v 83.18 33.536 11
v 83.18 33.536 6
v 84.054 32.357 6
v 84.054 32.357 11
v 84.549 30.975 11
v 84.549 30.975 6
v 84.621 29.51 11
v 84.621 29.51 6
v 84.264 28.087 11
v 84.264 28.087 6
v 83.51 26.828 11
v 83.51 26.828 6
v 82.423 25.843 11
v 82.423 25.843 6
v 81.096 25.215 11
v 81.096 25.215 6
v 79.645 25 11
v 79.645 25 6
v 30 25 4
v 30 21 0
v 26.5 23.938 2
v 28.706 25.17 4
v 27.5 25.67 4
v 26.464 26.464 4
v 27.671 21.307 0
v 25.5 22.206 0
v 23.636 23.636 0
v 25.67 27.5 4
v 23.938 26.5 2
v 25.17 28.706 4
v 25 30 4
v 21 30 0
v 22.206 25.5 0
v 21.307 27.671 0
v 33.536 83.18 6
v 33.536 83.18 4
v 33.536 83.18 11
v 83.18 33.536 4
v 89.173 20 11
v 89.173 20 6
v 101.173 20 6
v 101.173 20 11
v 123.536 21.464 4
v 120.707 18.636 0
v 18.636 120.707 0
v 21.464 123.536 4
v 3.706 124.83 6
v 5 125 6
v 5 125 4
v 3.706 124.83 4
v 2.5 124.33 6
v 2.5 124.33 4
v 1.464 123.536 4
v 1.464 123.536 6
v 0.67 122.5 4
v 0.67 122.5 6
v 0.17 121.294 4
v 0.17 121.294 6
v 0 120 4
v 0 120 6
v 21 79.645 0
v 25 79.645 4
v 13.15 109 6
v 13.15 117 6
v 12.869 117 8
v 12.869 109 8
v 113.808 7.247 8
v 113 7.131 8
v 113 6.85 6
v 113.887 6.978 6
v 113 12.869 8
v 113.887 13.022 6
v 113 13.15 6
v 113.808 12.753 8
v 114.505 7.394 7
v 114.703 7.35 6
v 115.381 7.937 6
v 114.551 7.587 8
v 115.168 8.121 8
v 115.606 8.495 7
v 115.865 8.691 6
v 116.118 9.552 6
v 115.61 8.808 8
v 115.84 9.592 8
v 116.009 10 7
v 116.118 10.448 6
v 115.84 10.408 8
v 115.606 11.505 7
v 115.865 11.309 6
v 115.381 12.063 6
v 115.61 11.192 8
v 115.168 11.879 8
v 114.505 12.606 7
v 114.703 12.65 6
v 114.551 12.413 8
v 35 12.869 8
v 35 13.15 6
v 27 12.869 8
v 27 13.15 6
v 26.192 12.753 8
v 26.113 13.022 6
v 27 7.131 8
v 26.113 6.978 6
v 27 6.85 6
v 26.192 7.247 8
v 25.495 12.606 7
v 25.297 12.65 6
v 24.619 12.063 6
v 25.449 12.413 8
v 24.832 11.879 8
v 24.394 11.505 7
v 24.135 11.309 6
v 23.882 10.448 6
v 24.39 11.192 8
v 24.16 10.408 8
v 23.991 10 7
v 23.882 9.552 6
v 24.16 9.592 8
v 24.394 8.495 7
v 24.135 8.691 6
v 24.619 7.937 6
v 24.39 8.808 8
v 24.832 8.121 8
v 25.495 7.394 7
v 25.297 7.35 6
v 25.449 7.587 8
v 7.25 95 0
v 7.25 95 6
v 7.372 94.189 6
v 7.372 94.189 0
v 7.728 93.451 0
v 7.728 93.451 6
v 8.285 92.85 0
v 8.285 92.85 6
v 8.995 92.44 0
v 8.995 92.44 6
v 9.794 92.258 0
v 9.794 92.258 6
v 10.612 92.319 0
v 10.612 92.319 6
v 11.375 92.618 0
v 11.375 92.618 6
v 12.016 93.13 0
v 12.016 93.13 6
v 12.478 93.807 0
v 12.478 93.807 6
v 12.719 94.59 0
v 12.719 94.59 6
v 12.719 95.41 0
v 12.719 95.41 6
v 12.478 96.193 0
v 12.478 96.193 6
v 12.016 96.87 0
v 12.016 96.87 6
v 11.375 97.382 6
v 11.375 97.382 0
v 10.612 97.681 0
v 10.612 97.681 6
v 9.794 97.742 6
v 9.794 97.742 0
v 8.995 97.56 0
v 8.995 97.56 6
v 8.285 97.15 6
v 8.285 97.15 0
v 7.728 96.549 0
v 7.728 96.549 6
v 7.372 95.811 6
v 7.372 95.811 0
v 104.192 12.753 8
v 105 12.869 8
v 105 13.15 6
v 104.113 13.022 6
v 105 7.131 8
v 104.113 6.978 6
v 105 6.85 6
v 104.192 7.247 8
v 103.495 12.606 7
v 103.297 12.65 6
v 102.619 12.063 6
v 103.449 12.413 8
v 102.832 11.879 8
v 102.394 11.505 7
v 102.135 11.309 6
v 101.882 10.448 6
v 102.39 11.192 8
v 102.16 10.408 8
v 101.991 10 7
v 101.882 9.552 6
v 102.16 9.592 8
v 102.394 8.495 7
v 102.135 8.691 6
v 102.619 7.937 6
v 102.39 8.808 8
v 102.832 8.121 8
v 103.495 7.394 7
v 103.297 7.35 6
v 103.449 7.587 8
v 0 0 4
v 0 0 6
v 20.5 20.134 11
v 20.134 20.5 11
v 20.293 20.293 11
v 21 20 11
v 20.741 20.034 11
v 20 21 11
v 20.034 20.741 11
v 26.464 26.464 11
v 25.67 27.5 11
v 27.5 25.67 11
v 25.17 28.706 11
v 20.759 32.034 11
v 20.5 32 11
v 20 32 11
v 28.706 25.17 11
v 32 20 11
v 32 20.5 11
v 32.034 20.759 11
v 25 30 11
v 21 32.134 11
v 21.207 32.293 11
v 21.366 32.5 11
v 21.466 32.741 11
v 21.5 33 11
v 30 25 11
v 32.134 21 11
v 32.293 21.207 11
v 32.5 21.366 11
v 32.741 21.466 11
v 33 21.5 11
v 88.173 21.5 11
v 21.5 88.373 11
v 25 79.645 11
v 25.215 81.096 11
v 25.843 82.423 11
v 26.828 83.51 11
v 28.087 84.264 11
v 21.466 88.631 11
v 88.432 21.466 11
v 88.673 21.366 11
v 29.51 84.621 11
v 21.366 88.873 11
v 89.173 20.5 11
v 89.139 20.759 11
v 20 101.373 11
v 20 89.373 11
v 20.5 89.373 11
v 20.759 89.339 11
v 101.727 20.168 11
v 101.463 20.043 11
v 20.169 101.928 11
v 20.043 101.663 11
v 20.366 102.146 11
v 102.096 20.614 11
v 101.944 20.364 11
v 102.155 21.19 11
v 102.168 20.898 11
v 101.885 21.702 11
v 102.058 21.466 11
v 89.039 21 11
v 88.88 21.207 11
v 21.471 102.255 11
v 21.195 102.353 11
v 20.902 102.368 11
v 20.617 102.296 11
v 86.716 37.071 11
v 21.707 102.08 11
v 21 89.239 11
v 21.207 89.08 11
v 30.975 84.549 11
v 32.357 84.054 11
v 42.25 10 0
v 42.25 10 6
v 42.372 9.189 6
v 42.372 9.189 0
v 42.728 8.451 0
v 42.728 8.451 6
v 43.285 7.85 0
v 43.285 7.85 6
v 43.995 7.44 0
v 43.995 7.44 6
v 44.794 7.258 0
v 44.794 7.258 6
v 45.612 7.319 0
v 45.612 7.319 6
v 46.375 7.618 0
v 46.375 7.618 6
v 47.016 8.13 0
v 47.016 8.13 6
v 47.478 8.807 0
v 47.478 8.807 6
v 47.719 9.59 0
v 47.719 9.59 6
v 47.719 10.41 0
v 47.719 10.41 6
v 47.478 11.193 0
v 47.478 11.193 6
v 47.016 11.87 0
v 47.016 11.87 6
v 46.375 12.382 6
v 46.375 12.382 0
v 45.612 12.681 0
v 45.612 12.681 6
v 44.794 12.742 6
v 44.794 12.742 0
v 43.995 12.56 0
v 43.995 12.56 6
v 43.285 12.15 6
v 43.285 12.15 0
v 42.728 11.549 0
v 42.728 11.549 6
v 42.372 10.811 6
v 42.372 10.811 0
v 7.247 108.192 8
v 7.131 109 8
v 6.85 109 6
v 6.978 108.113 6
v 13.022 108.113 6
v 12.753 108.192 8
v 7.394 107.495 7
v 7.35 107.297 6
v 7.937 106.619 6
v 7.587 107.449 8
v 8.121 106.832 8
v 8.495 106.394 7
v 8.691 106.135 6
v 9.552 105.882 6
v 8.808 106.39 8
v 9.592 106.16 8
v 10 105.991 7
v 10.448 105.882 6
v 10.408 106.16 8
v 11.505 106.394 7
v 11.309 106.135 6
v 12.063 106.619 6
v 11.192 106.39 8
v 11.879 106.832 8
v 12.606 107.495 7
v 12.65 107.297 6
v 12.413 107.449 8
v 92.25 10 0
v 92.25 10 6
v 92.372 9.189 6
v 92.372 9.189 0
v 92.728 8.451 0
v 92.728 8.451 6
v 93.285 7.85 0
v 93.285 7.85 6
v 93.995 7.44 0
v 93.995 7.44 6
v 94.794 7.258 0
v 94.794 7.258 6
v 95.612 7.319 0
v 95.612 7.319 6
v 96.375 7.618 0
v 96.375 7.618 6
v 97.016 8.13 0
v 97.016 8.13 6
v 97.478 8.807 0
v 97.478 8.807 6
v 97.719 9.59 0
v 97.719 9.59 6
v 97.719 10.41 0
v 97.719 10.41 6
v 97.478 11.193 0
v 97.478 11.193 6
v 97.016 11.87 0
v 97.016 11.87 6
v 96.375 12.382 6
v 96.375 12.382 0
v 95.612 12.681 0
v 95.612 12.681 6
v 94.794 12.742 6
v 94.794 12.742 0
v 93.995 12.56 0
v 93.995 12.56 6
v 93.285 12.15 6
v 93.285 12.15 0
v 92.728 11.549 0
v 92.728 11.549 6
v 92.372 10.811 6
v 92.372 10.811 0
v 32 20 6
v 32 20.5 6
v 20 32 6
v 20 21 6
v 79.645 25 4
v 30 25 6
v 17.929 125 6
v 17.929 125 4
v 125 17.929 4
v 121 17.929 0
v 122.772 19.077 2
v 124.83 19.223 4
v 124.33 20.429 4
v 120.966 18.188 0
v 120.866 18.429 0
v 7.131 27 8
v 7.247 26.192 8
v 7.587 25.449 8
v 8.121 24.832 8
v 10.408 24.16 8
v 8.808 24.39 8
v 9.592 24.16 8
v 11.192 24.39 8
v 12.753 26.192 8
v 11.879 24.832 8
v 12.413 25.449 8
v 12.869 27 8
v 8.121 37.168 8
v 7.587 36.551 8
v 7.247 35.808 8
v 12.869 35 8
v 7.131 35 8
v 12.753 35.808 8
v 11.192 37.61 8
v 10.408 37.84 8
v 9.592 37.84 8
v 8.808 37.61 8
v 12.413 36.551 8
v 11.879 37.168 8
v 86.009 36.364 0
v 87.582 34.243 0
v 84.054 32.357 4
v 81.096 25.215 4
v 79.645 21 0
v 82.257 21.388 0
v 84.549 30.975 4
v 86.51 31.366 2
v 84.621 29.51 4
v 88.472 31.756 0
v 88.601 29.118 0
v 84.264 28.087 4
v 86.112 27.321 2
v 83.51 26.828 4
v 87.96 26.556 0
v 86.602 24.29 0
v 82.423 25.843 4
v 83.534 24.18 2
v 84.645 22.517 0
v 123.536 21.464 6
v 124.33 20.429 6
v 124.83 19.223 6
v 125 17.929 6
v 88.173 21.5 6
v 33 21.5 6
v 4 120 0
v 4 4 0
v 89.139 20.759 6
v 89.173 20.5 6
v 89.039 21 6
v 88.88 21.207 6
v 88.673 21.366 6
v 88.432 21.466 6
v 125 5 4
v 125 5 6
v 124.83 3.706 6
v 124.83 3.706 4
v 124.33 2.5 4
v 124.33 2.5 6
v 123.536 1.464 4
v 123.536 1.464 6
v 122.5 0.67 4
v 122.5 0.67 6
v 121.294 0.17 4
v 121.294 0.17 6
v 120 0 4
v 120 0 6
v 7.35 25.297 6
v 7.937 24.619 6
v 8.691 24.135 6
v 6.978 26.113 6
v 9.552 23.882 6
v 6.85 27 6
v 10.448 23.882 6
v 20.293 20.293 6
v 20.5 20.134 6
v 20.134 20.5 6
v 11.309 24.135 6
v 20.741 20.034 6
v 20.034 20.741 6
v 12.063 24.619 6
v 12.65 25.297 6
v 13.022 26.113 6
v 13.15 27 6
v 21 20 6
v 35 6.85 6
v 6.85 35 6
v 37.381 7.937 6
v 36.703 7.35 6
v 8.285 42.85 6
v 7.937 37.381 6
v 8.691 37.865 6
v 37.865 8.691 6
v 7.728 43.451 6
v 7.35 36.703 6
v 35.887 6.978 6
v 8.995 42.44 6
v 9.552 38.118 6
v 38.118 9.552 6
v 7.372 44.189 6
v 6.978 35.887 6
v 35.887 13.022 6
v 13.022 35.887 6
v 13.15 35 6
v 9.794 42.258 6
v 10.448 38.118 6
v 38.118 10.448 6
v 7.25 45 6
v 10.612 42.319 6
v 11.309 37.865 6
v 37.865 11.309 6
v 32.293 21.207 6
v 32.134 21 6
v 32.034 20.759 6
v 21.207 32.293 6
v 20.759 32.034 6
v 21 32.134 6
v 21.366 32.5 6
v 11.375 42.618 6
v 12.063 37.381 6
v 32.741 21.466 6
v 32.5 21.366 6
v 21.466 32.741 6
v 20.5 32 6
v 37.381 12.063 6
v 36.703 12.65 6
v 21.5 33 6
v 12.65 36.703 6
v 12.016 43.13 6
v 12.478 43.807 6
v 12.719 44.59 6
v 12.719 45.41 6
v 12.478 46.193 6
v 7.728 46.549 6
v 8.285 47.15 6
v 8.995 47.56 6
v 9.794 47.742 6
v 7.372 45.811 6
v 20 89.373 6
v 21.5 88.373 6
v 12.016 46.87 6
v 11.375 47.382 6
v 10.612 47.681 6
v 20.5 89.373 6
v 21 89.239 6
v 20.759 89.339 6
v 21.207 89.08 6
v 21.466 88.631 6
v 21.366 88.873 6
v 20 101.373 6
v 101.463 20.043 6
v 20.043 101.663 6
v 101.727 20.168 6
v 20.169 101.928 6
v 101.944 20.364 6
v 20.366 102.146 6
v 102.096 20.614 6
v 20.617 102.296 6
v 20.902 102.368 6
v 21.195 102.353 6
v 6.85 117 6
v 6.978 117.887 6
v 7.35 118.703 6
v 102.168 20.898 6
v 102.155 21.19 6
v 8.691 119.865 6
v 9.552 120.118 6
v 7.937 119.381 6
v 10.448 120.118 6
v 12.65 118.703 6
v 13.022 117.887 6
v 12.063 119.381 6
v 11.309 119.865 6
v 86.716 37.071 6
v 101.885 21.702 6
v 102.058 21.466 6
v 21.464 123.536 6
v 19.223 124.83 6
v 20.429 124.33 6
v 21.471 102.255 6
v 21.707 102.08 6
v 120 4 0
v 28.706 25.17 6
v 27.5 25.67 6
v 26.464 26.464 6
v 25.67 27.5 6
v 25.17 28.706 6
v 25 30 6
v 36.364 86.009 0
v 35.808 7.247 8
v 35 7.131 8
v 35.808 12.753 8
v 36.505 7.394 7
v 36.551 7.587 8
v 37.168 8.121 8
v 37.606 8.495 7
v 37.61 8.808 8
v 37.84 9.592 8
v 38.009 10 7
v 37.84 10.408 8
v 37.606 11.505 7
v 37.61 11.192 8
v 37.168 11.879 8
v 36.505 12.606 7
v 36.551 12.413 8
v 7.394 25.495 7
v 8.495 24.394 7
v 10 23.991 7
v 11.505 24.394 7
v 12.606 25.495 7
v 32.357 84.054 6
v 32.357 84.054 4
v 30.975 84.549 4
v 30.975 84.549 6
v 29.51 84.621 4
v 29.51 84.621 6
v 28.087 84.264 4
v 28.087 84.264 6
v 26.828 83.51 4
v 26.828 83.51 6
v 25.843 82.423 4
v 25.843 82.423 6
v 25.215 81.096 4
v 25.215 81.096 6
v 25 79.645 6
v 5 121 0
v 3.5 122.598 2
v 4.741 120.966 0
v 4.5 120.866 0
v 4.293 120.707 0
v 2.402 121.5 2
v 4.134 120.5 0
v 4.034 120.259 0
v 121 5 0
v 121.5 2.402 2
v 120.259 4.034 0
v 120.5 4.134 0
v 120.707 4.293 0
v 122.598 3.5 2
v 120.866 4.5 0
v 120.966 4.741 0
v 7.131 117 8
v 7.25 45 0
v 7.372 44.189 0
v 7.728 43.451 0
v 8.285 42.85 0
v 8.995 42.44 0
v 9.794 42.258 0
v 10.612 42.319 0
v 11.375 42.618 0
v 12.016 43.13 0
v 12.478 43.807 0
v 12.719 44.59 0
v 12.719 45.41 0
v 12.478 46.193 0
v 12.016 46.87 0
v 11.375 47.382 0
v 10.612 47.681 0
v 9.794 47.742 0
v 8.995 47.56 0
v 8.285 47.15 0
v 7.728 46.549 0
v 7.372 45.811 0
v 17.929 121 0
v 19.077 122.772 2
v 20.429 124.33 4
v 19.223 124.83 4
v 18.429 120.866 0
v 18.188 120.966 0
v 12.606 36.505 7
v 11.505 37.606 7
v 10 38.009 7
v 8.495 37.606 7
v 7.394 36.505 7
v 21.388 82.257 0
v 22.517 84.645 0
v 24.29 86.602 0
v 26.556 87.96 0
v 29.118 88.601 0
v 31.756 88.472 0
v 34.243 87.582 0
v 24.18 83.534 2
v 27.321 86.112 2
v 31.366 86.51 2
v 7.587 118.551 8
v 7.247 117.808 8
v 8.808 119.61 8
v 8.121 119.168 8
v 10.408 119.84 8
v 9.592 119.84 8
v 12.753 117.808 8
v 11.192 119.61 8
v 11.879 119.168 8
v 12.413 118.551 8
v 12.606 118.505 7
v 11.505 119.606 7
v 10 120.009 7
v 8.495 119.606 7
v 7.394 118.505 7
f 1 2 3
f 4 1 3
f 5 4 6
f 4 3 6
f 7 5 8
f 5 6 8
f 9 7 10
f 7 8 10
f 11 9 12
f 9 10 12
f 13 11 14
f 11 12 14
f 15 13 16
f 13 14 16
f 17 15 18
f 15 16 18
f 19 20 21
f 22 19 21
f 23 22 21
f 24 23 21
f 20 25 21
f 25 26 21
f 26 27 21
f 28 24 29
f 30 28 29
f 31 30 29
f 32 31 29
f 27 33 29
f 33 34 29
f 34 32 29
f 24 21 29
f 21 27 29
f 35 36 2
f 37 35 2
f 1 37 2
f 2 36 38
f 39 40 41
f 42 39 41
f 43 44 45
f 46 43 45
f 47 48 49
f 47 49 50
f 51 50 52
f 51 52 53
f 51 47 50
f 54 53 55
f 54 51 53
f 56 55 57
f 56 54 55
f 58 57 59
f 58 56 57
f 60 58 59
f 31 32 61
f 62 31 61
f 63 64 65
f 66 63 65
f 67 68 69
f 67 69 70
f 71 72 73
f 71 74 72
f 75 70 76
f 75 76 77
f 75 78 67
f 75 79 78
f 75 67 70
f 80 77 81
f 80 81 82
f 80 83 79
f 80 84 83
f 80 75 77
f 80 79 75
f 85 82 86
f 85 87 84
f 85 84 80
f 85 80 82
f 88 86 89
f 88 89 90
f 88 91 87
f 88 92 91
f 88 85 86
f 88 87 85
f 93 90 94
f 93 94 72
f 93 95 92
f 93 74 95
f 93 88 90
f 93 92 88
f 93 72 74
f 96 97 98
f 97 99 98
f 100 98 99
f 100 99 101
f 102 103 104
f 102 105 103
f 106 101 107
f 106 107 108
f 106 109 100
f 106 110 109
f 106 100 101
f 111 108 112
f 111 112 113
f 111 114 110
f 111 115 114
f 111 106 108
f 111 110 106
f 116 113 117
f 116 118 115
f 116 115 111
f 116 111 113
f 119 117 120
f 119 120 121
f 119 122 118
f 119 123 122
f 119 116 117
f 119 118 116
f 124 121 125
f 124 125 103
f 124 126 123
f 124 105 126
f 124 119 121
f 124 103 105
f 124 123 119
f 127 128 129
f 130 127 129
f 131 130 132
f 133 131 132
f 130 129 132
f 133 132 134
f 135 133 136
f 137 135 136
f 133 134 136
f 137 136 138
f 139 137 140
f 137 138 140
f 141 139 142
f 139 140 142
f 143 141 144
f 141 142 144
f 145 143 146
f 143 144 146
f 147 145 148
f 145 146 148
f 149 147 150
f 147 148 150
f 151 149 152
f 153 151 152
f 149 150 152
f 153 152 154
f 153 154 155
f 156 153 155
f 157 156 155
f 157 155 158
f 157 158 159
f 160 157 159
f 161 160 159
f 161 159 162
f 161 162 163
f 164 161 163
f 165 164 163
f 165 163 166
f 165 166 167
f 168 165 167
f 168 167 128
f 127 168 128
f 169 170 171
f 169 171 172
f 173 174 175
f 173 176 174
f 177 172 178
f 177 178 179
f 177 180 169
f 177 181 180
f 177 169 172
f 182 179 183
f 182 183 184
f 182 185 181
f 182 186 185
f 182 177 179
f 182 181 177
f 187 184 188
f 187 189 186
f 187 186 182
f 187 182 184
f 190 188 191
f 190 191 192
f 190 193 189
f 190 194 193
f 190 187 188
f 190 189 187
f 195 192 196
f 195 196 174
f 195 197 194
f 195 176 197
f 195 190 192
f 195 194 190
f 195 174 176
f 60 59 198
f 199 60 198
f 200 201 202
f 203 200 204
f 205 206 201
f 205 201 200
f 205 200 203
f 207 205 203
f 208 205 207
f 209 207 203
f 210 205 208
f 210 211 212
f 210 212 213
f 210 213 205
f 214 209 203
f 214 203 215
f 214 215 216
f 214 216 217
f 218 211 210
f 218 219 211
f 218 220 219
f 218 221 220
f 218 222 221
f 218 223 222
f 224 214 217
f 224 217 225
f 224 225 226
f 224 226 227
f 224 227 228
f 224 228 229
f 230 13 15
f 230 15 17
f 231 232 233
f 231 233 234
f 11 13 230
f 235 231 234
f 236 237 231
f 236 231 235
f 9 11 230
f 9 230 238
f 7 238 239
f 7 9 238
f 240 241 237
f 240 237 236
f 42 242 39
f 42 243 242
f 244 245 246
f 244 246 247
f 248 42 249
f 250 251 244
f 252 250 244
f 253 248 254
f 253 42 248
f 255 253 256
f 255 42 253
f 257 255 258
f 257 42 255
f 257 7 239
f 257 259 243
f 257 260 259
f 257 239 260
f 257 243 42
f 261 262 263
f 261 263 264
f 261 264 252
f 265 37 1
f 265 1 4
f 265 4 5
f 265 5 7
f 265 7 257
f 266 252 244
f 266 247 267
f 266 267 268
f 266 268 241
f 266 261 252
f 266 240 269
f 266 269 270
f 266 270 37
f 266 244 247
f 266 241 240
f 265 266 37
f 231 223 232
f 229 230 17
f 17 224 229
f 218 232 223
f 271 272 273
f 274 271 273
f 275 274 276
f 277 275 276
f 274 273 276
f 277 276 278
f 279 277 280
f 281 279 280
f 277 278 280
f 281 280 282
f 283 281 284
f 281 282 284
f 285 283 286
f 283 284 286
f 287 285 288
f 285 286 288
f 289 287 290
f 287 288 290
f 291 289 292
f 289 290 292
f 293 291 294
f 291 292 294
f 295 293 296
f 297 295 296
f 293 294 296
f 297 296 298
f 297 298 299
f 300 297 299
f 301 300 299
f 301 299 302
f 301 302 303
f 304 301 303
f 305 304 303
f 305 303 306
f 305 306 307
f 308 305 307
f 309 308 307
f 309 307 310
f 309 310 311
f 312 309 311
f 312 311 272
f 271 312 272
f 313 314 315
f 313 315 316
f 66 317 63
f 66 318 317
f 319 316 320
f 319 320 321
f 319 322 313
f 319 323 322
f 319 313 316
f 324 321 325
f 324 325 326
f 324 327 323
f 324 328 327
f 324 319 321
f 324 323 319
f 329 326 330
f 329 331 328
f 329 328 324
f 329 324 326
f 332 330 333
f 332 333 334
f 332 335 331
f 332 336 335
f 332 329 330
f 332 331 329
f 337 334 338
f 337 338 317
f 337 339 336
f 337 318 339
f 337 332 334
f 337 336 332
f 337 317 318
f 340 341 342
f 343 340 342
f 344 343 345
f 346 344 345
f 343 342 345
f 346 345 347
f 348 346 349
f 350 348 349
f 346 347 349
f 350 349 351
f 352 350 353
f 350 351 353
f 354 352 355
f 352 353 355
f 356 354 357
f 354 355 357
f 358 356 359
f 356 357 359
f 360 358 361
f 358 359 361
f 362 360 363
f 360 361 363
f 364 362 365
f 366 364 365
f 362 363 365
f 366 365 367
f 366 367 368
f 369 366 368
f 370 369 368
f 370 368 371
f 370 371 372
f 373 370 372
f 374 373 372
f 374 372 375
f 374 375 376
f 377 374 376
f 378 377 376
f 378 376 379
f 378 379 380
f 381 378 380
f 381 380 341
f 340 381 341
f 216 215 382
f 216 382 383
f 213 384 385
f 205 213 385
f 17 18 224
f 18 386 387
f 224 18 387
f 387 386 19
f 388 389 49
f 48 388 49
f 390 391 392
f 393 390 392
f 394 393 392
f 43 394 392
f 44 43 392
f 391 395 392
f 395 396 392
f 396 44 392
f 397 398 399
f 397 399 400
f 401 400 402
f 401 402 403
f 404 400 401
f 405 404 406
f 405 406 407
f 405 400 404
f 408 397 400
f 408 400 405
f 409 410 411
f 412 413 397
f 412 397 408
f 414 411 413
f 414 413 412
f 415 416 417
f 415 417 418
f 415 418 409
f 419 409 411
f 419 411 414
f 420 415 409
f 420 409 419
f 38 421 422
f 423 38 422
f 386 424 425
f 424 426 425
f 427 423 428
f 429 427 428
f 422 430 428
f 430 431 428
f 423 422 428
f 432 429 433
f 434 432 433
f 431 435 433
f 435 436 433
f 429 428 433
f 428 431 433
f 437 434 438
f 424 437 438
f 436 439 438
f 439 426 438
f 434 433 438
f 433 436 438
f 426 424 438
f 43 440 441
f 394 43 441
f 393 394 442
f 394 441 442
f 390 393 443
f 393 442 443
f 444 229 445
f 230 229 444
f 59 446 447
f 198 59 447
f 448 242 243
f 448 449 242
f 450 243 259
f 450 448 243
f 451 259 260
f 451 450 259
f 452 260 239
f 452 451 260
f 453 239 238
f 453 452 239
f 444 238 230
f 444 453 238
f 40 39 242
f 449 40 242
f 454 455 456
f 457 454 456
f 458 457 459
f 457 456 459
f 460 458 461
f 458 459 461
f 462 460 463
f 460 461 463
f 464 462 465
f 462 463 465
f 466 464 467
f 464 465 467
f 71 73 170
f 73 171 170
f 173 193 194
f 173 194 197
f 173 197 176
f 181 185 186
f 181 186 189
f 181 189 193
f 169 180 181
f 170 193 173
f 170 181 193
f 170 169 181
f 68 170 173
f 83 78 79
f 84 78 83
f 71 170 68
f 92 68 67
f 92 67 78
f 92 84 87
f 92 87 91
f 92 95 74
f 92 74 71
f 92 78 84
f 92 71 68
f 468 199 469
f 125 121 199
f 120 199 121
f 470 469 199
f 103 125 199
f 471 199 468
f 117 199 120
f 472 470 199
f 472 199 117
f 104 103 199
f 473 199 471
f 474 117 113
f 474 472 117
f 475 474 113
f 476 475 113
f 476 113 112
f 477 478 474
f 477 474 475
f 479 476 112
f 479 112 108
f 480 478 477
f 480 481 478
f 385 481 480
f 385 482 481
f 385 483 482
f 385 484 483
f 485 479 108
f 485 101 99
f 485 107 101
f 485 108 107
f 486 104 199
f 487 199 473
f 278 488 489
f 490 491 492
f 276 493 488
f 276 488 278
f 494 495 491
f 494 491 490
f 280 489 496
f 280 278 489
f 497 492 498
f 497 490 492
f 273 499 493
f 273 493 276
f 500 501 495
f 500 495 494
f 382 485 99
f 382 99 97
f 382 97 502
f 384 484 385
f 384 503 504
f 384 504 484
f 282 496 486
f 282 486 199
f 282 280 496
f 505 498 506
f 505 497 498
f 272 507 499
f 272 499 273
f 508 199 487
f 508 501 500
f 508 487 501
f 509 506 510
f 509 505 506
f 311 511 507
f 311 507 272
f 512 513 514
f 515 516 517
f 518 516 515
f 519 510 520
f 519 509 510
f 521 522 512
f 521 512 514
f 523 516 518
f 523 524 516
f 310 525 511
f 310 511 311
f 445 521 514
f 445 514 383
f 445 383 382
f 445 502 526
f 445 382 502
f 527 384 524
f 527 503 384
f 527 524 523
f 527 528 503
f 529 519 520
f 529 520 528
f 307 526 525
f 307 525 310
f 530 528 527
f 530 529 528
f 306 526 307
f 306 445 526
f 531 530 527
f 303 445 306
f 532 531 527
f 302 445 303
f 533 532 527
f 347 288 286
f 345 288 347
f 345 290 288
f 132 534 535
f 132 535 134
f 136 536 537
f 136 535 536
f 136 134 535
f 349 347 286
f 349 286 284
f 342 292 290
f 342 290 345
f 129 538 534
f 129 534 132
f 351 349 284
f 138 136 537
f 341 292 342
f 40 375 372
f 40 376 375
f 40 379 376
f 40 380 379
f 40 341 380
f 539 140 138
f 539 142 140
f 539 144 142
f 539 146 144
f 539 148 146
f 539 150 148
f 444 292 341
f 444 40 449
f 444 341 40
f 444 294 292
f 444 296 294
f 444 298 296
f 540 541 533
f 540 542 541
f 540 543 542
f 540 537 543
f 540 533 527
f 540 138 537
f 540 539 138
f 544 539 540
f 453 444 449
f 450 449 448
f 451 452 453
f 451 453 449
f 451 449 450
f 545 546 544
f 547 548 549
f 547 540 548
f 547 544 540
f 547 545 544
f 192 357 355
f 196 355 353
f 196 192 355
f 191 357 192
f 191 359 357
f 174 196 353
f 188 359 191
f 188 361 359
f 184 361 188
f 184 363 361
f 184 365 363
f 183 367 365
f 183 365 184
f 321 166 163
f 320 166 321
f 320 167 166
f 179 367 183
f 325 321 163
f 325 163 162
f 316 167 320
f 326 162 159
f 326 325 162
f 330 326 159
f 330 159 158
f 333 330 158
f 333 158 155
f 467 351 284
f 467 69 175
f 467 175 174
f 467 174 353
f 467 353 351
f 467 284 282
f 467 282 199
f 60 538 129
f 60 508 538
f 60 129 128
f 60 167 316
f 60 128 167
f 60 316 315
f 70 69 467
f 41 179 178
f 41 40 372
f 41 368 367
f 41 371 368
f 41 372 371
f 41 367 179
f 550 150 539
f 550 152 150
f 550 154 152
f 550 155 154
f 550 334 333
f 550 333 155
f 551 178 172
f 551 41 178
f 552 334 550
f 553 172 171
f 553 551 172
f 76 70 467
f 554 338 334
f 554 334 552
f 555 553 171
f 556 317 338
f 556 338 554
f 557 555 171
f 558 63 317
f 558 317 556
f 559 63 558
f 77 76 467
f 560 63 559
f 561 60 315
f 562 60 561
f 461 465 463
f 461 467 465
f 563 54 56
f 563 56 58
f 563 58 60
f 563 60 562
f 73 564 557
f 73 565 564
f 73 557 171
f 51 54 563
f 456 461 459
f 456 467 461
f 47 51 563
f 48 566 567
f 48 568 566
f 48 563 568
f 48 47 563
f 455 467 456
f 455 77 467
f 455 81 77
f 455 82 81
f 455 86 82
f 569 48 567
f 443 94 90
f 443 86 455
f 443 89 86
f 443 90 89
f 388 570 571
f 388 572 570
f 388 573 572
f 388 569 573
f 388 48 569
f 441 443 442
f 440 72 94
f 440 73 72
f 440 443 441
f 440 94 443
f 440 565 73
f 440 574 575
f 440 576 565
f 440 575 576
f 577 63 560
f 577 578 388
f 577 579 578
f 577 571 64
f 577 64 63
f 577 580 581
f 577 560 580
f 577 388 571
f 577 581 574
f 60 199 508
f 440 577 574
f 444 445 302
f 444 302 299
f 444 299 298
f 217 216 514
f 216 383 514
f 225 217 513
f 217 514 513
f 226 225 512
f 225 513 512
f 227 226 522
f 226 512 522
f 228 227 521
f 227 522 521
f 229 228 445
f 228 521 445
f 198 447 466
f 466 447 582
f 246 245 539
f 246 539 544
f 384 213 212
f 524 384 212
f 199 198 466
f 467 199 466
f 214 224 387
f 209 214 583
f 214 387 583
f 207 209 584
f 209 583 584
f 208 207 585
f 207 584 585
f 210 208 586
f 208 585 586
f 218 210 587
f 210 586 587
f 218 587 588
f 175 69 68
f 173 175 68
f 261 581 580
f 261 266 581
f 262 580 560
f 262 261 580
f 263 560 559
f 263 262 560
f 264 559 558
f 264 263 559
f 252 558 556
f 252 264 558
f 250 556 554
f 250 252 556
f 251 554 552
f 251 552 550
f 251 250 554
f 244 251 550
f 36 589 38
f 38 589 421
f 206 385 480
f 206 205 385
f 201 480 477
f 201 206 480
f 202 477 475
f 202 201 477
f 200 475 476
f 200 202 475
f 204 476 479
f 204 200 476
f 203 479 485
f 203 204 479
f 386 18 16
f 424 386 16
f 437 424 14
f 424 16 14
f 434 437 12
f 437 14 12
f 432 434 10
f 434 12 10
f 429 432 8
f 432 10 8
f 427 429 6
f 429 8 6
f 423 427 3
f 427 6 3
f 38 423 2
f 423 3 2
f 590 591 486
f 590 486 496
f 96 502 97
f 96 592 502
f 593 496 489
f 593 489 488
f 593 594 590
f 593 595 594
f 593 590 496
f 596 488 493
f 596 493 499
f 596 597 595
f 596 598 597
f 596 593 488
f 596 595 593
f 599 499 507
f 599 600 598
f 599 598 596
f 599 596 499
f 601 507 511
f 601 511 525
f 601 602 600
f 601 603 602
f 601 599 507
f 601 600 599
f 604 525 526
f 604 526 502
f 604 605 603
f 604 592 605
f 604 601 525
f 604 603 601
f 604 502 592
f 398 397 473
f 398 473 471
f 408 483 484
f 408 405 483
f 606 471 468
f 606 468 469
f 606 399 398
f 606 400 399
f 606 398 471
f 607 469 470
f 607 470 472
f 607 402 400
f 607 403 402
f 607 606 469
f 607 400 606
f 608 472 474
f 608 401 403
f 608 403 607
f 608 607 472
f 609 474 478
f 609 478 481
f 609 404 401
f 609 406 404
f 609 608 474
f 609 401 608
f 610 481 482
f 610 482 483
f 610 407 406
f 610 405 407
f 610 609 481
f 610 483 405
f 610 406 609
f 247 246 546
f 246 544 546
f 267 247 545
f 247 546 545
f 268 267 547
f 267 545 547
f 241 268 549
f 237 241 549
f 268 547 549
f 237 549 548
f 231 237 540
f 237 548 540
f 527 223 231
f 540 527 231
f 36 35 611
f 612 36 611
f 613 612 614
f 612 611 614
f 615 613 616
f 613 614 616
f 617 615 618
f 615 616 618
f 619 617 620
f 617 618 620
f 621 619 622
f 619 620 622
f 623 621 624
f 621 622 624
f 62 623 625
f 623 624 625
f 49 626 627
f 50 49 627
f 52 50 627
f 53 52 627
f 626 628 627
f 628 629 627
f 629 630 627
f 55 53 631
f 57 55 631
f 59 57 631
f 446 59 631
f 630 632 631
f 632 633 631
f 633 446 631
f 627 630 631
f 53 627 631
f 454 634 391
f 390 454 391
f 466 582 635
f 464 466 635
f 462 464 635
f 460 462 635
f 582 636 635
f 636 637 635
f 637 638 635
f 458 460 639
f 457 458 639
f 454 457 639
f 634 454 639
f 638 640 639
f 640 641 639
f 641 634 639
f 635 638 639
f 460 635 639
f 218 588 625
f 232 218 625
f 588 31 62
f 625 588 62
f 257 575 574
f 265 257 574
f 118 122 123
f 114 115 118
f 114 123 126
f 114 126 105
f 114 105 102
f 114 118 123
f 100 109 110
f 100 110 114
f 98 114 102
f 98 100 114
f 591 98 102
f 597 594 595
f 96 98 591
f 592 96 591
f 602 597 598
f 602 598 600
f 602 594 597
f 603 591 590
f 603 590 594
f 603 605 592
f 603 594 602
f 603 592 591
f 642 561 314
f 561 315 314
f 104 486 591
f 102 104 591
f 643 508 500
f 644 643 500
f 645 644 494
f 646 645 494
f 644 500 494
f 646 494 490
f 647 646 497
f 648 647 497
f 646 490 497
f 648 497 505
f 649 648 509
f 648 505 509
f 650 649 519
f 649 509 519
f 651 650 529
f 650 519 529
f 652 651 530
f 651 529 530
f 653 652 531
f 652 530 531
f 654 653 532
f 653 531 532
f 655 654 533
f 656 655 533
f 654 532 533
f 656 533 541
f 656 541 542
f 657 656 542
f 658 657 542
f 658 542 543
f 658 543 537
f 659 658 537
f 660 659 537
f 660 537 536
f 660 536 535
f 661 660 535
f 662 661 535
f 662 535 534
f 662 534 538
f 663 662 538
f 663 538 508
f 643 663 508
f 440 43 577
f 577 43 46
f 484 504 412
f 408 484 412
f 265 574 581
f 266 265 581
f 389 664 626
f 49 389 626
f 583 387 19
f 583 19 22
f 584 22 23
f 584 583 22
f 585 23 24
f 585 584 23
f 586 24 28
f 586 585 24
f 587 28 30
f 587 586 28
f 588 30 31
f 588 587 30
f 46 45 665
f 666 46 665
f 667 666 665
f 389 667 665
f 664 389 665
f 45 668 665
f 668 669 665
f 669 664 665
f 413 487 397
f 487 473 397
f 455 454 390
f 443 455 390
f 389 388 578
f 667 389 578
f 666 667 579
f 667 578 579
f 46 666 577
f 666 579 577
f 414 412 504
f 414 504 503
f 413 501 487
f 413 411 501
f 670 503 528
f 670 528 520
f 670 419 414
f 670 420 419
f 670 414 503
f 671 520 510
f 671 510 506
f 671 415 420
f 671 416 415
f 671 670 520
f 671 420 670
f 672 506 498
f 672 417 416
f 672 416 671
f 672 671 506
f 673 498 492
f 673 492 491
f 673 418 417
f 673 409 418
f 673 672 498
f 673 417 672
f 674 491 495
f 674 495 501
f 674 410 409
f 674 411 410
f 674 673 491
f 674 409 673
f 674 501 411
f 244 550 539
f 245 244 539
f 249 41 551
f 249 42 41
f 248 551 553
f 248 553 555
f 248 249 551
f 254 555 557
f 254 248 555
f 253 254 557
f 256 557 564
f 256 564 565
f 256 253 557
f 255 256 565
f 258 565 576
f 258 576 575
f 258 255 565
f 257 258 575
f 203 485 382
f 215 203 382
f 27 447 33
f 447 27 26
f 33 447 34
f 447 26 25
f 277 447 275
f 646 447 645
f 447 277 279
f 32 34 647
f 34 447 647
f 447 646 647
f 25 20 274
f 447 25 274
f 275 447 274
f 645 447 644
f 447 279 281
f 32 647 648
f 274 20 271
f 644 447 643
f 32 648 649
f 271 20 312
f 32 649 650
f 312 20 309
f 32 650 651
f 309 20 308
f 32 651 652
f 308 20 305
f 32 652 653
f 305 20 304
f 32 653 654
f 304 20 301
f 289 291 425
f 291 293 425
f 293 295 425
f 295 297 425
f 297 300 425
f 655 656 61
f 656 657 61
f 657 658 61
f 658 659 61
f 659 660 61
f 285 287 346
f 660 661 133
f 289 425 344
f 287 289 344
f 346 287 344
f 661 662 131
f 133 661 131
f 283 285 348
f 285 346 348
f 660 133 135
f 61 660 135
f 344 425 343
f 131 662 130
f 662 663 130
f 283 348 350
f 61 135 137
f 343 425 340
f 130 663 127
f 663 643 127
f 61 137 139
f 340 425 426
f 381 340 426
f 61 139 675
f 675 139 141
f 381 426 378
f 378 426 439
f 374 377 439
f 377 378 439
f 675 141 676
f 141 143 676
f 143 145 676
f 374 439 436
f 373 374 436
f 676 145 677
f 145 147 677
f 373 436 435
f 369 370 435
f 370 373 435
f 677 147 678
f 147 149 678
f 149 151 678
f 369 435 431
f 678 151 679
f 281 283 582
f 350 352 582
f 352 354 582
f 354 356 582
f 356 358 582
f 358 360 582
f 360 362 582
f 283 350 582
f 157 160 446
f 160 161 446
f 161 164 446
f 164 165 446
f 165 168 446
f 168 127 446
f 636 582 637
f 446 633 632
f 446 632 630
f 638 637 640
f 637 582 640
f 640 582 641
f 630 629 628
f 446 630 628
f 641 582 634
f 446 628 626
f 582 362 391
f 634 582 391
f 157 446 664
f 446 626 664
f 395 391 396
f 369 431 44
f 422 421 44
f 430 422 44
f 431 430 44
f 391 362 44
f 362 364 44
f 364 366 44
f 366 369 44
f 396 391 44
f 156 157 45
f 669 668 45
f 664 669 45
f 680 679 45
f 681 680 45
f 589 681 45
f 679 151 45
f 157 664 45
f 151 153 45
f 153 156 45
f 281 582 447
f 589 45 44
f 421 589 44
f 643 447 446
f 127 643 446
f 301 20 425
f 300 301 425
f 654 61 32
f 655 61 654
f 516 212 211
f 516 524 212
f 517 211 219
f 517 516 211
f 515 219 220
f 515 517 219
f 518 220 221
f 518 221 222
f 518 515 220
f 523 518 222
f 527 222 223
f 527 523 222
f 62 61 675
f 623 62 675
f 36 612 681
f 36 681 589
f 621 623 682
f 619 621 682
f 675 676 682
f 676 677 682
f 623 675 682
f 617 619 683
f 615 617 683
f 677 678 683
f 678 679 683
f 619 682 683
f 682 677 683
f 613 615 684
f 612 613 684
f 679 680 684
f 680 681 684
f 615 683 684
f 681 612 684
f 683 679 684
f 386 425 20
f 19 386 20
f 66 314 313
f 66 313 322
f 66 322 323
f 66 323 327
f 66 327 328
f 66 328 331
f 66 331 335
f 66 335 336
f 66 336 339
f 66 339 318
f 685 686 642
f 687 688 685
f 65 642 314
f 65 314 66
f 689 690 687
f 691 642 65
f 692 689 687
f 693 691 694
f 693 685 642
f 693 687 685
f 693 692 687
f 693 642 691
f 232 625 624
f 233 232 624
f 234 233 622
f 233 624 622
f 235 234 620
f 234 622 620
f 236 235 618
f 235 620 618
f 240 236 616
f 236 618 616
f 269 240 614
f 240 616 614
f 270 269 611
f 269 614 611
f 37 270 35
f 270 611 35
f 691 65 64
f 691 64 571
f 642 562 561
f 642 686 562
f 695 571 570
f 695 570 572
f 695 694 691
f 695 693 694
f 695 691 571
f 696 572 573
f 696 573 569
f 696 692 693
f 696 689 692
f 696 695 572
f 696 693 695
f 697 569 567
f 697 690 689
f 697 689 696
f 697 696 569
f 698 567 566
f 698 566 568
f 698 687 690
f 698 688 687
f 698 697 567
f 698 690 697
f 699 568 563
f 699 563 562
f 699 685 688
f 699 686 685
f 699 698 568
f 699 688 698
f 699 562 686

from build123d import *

# Parameters (mm, degrees)
F1_DEPTH  = 6
F2_R      = 5
F4_DEPTH  = 5
F5_SIZE   = 4
F6_R      = 1
F8_D      = 5.5
F9_W      = 57.1730165467
F9_H      = 1.5
F9_W_2    = 1.5
F9_H_2    = 57.372583002
F10_DEPTH = 5
F11_R     = 1
F13_DEPTH = 2
F13_TAPER = 8


with BuildPart() as f1:
    # F0 (on Top) → F1 (new body)
    with BuildSketch(Plane.XY):
        Polygon((20, 125), (0, 125), (0, 0), (125, 0), (125, 20), align=None)
        Polygon((25, 25), (25, 91.7157287525), (91.7157287525, 25), align=None, mode=Mode.SUBTRACT)
    extrude(amount=F1_DEPTH)

    # F2
    f2_edges = [f1.edges().sort_by_distance(p)[0] for p in [
        (25, 91.715729, 3),
        (91.715729, 25, 3),
        (25, 25, 3),
        (0, 125, 3),
        (20, 125, 3),
        (125, 20, 3),
        (125, 0, 3),
    ]]
    fillet(f2_edges, radius=F2_R)

    # F3 (on face) → F4 (join)
    with BuildSketch(Plane.XY.offset(6)):
        Polygon((86.7157287525, 37.0710678119), (37.0710678119, 86.7157287525), (20, 103.7867965644), (20, 79.6446609407), (20, 30), (20, 20), (30, 20), (79.6446609407, 20), (103.5650894046, 20), align=None)
        with BuildLine():
            ThreePointArc((30, 25), (26.4644660941, 26.4644660941), (25, 30))
            Line((25, 30), (25, 79.6446609407))
            ThreePointArc((25, 79.6446609407), (28.0865828382, 84.2640586032), (33.5355339059, 83.1801948466))
            Line((33.5355339059, 83.1801948466), (83.1801948466, 33.5355339059))
            ThreePointArc((83.1801948466, 33.5355339059), (84.2640586032, 28.0865828382), (79.6446609407, 25))
            Line((79.6446609407, 25), (30, 25))
        make_face(mode=Mode.SUBTRACT)
    extrude(amount=F4_DEPTH)

    # F5
    f5_edges = [f1.edges().sort_by_distance(p)[0] for p in [
        (58.357864, 58.357864, 0),
        (72.5, 72.5, 0),
    ]]
    chamfer(f5_edges, length=F5_SIZE)

    # F6
    f6_edges = [f1.edges().sort_by_distance(p)[0] for p in [
        (20, 103.786797, 8.5),
        (20, 20, 8.5),
        (103.565089, 20, 8.5),
    ]]
    fillet(f6_edges, radius=F6_R)

    # F8 (through all)
    with Locations(Plane(origin=(0, 0, 0), x_dir=(1, 0, 0), z_dir=(0, 0, -1))):
        with Locations((95, -10), (45, -10), (10, -45), (10, -95)):
            Hole(F8_D / 2)

    # F9 (on face) → F10 (cut, through all)
    with BuildSketch(Plane.XY.offset(11)):
        with Locations((60.5865082733, 20.75)):
            Rectangle(F9_W, F9_H)
        with Locations((20.75, 60.686291501)):
            Rectangle(F9_W_2, F9_H_2)
    extrude(amount=-F10_DEPTH, mode=Mode.SUBTRACT)

    # F11
    f11_edges = [f1.edges().sort_by_distance(p)[0] for p in [
        (21.5, 89.372583, 8.5),
        (21.5, 32, 8.5),
        (32, 21.5, 8.5),
        (89.173017, 21.5, 8.5),
    ]]
    fillet(f11_edges, radius=F11_R)

    # F12 (on face) → F13 (join)
    with BuildSketch(Plane.XY.offset(6)):
        with BuildLine():
            Line((6.85, 117), (6.85, 109))
            ThreePointArc((6.85, 109), (10, 105.85), (13.15, 109))
            Line((13.15, 109), (13.15, 117))
            ThreePointArc((13.15, 117), (10, 120.15), (6.85, 117))
        make_face()
        with BuildLine():
            Line((6.85, 35), (6.85, 27))
            ThreePointArc((6.85, 27), (10, 23.85), (13.15, 27))
            Line((13.15, 27), (13.15, 35))
            ThreePointArc((13.15, 35), (10, 38.15), (6.85, 35))
        make_face()
        with BuildLine():
            Line((35, 13.15), (27, 13.15))
            ThreePointArc((27, 13.15), (23.85, 10), (27, 6.85))
            Line((27, 6.85), (35, 6.85))
            ThreePointArc((35, 6.85), (38.15, 10), (35, 13.15))
        make_face()
        with BuildLine():
            Line((113, 13.15), (105, 13.15))
            ThreePointArc((105, 13.15), (101.85, 10), (105, 6.85))
            Line((105, 6.85), (113, 6.85))
            ThreePointArc((113, 6.85), (116.15, 10), (113, 13.15))
        make_face()
    extrude(amount=F13_DEPTH, taper=F13_TAPER)


solid = f1.part
